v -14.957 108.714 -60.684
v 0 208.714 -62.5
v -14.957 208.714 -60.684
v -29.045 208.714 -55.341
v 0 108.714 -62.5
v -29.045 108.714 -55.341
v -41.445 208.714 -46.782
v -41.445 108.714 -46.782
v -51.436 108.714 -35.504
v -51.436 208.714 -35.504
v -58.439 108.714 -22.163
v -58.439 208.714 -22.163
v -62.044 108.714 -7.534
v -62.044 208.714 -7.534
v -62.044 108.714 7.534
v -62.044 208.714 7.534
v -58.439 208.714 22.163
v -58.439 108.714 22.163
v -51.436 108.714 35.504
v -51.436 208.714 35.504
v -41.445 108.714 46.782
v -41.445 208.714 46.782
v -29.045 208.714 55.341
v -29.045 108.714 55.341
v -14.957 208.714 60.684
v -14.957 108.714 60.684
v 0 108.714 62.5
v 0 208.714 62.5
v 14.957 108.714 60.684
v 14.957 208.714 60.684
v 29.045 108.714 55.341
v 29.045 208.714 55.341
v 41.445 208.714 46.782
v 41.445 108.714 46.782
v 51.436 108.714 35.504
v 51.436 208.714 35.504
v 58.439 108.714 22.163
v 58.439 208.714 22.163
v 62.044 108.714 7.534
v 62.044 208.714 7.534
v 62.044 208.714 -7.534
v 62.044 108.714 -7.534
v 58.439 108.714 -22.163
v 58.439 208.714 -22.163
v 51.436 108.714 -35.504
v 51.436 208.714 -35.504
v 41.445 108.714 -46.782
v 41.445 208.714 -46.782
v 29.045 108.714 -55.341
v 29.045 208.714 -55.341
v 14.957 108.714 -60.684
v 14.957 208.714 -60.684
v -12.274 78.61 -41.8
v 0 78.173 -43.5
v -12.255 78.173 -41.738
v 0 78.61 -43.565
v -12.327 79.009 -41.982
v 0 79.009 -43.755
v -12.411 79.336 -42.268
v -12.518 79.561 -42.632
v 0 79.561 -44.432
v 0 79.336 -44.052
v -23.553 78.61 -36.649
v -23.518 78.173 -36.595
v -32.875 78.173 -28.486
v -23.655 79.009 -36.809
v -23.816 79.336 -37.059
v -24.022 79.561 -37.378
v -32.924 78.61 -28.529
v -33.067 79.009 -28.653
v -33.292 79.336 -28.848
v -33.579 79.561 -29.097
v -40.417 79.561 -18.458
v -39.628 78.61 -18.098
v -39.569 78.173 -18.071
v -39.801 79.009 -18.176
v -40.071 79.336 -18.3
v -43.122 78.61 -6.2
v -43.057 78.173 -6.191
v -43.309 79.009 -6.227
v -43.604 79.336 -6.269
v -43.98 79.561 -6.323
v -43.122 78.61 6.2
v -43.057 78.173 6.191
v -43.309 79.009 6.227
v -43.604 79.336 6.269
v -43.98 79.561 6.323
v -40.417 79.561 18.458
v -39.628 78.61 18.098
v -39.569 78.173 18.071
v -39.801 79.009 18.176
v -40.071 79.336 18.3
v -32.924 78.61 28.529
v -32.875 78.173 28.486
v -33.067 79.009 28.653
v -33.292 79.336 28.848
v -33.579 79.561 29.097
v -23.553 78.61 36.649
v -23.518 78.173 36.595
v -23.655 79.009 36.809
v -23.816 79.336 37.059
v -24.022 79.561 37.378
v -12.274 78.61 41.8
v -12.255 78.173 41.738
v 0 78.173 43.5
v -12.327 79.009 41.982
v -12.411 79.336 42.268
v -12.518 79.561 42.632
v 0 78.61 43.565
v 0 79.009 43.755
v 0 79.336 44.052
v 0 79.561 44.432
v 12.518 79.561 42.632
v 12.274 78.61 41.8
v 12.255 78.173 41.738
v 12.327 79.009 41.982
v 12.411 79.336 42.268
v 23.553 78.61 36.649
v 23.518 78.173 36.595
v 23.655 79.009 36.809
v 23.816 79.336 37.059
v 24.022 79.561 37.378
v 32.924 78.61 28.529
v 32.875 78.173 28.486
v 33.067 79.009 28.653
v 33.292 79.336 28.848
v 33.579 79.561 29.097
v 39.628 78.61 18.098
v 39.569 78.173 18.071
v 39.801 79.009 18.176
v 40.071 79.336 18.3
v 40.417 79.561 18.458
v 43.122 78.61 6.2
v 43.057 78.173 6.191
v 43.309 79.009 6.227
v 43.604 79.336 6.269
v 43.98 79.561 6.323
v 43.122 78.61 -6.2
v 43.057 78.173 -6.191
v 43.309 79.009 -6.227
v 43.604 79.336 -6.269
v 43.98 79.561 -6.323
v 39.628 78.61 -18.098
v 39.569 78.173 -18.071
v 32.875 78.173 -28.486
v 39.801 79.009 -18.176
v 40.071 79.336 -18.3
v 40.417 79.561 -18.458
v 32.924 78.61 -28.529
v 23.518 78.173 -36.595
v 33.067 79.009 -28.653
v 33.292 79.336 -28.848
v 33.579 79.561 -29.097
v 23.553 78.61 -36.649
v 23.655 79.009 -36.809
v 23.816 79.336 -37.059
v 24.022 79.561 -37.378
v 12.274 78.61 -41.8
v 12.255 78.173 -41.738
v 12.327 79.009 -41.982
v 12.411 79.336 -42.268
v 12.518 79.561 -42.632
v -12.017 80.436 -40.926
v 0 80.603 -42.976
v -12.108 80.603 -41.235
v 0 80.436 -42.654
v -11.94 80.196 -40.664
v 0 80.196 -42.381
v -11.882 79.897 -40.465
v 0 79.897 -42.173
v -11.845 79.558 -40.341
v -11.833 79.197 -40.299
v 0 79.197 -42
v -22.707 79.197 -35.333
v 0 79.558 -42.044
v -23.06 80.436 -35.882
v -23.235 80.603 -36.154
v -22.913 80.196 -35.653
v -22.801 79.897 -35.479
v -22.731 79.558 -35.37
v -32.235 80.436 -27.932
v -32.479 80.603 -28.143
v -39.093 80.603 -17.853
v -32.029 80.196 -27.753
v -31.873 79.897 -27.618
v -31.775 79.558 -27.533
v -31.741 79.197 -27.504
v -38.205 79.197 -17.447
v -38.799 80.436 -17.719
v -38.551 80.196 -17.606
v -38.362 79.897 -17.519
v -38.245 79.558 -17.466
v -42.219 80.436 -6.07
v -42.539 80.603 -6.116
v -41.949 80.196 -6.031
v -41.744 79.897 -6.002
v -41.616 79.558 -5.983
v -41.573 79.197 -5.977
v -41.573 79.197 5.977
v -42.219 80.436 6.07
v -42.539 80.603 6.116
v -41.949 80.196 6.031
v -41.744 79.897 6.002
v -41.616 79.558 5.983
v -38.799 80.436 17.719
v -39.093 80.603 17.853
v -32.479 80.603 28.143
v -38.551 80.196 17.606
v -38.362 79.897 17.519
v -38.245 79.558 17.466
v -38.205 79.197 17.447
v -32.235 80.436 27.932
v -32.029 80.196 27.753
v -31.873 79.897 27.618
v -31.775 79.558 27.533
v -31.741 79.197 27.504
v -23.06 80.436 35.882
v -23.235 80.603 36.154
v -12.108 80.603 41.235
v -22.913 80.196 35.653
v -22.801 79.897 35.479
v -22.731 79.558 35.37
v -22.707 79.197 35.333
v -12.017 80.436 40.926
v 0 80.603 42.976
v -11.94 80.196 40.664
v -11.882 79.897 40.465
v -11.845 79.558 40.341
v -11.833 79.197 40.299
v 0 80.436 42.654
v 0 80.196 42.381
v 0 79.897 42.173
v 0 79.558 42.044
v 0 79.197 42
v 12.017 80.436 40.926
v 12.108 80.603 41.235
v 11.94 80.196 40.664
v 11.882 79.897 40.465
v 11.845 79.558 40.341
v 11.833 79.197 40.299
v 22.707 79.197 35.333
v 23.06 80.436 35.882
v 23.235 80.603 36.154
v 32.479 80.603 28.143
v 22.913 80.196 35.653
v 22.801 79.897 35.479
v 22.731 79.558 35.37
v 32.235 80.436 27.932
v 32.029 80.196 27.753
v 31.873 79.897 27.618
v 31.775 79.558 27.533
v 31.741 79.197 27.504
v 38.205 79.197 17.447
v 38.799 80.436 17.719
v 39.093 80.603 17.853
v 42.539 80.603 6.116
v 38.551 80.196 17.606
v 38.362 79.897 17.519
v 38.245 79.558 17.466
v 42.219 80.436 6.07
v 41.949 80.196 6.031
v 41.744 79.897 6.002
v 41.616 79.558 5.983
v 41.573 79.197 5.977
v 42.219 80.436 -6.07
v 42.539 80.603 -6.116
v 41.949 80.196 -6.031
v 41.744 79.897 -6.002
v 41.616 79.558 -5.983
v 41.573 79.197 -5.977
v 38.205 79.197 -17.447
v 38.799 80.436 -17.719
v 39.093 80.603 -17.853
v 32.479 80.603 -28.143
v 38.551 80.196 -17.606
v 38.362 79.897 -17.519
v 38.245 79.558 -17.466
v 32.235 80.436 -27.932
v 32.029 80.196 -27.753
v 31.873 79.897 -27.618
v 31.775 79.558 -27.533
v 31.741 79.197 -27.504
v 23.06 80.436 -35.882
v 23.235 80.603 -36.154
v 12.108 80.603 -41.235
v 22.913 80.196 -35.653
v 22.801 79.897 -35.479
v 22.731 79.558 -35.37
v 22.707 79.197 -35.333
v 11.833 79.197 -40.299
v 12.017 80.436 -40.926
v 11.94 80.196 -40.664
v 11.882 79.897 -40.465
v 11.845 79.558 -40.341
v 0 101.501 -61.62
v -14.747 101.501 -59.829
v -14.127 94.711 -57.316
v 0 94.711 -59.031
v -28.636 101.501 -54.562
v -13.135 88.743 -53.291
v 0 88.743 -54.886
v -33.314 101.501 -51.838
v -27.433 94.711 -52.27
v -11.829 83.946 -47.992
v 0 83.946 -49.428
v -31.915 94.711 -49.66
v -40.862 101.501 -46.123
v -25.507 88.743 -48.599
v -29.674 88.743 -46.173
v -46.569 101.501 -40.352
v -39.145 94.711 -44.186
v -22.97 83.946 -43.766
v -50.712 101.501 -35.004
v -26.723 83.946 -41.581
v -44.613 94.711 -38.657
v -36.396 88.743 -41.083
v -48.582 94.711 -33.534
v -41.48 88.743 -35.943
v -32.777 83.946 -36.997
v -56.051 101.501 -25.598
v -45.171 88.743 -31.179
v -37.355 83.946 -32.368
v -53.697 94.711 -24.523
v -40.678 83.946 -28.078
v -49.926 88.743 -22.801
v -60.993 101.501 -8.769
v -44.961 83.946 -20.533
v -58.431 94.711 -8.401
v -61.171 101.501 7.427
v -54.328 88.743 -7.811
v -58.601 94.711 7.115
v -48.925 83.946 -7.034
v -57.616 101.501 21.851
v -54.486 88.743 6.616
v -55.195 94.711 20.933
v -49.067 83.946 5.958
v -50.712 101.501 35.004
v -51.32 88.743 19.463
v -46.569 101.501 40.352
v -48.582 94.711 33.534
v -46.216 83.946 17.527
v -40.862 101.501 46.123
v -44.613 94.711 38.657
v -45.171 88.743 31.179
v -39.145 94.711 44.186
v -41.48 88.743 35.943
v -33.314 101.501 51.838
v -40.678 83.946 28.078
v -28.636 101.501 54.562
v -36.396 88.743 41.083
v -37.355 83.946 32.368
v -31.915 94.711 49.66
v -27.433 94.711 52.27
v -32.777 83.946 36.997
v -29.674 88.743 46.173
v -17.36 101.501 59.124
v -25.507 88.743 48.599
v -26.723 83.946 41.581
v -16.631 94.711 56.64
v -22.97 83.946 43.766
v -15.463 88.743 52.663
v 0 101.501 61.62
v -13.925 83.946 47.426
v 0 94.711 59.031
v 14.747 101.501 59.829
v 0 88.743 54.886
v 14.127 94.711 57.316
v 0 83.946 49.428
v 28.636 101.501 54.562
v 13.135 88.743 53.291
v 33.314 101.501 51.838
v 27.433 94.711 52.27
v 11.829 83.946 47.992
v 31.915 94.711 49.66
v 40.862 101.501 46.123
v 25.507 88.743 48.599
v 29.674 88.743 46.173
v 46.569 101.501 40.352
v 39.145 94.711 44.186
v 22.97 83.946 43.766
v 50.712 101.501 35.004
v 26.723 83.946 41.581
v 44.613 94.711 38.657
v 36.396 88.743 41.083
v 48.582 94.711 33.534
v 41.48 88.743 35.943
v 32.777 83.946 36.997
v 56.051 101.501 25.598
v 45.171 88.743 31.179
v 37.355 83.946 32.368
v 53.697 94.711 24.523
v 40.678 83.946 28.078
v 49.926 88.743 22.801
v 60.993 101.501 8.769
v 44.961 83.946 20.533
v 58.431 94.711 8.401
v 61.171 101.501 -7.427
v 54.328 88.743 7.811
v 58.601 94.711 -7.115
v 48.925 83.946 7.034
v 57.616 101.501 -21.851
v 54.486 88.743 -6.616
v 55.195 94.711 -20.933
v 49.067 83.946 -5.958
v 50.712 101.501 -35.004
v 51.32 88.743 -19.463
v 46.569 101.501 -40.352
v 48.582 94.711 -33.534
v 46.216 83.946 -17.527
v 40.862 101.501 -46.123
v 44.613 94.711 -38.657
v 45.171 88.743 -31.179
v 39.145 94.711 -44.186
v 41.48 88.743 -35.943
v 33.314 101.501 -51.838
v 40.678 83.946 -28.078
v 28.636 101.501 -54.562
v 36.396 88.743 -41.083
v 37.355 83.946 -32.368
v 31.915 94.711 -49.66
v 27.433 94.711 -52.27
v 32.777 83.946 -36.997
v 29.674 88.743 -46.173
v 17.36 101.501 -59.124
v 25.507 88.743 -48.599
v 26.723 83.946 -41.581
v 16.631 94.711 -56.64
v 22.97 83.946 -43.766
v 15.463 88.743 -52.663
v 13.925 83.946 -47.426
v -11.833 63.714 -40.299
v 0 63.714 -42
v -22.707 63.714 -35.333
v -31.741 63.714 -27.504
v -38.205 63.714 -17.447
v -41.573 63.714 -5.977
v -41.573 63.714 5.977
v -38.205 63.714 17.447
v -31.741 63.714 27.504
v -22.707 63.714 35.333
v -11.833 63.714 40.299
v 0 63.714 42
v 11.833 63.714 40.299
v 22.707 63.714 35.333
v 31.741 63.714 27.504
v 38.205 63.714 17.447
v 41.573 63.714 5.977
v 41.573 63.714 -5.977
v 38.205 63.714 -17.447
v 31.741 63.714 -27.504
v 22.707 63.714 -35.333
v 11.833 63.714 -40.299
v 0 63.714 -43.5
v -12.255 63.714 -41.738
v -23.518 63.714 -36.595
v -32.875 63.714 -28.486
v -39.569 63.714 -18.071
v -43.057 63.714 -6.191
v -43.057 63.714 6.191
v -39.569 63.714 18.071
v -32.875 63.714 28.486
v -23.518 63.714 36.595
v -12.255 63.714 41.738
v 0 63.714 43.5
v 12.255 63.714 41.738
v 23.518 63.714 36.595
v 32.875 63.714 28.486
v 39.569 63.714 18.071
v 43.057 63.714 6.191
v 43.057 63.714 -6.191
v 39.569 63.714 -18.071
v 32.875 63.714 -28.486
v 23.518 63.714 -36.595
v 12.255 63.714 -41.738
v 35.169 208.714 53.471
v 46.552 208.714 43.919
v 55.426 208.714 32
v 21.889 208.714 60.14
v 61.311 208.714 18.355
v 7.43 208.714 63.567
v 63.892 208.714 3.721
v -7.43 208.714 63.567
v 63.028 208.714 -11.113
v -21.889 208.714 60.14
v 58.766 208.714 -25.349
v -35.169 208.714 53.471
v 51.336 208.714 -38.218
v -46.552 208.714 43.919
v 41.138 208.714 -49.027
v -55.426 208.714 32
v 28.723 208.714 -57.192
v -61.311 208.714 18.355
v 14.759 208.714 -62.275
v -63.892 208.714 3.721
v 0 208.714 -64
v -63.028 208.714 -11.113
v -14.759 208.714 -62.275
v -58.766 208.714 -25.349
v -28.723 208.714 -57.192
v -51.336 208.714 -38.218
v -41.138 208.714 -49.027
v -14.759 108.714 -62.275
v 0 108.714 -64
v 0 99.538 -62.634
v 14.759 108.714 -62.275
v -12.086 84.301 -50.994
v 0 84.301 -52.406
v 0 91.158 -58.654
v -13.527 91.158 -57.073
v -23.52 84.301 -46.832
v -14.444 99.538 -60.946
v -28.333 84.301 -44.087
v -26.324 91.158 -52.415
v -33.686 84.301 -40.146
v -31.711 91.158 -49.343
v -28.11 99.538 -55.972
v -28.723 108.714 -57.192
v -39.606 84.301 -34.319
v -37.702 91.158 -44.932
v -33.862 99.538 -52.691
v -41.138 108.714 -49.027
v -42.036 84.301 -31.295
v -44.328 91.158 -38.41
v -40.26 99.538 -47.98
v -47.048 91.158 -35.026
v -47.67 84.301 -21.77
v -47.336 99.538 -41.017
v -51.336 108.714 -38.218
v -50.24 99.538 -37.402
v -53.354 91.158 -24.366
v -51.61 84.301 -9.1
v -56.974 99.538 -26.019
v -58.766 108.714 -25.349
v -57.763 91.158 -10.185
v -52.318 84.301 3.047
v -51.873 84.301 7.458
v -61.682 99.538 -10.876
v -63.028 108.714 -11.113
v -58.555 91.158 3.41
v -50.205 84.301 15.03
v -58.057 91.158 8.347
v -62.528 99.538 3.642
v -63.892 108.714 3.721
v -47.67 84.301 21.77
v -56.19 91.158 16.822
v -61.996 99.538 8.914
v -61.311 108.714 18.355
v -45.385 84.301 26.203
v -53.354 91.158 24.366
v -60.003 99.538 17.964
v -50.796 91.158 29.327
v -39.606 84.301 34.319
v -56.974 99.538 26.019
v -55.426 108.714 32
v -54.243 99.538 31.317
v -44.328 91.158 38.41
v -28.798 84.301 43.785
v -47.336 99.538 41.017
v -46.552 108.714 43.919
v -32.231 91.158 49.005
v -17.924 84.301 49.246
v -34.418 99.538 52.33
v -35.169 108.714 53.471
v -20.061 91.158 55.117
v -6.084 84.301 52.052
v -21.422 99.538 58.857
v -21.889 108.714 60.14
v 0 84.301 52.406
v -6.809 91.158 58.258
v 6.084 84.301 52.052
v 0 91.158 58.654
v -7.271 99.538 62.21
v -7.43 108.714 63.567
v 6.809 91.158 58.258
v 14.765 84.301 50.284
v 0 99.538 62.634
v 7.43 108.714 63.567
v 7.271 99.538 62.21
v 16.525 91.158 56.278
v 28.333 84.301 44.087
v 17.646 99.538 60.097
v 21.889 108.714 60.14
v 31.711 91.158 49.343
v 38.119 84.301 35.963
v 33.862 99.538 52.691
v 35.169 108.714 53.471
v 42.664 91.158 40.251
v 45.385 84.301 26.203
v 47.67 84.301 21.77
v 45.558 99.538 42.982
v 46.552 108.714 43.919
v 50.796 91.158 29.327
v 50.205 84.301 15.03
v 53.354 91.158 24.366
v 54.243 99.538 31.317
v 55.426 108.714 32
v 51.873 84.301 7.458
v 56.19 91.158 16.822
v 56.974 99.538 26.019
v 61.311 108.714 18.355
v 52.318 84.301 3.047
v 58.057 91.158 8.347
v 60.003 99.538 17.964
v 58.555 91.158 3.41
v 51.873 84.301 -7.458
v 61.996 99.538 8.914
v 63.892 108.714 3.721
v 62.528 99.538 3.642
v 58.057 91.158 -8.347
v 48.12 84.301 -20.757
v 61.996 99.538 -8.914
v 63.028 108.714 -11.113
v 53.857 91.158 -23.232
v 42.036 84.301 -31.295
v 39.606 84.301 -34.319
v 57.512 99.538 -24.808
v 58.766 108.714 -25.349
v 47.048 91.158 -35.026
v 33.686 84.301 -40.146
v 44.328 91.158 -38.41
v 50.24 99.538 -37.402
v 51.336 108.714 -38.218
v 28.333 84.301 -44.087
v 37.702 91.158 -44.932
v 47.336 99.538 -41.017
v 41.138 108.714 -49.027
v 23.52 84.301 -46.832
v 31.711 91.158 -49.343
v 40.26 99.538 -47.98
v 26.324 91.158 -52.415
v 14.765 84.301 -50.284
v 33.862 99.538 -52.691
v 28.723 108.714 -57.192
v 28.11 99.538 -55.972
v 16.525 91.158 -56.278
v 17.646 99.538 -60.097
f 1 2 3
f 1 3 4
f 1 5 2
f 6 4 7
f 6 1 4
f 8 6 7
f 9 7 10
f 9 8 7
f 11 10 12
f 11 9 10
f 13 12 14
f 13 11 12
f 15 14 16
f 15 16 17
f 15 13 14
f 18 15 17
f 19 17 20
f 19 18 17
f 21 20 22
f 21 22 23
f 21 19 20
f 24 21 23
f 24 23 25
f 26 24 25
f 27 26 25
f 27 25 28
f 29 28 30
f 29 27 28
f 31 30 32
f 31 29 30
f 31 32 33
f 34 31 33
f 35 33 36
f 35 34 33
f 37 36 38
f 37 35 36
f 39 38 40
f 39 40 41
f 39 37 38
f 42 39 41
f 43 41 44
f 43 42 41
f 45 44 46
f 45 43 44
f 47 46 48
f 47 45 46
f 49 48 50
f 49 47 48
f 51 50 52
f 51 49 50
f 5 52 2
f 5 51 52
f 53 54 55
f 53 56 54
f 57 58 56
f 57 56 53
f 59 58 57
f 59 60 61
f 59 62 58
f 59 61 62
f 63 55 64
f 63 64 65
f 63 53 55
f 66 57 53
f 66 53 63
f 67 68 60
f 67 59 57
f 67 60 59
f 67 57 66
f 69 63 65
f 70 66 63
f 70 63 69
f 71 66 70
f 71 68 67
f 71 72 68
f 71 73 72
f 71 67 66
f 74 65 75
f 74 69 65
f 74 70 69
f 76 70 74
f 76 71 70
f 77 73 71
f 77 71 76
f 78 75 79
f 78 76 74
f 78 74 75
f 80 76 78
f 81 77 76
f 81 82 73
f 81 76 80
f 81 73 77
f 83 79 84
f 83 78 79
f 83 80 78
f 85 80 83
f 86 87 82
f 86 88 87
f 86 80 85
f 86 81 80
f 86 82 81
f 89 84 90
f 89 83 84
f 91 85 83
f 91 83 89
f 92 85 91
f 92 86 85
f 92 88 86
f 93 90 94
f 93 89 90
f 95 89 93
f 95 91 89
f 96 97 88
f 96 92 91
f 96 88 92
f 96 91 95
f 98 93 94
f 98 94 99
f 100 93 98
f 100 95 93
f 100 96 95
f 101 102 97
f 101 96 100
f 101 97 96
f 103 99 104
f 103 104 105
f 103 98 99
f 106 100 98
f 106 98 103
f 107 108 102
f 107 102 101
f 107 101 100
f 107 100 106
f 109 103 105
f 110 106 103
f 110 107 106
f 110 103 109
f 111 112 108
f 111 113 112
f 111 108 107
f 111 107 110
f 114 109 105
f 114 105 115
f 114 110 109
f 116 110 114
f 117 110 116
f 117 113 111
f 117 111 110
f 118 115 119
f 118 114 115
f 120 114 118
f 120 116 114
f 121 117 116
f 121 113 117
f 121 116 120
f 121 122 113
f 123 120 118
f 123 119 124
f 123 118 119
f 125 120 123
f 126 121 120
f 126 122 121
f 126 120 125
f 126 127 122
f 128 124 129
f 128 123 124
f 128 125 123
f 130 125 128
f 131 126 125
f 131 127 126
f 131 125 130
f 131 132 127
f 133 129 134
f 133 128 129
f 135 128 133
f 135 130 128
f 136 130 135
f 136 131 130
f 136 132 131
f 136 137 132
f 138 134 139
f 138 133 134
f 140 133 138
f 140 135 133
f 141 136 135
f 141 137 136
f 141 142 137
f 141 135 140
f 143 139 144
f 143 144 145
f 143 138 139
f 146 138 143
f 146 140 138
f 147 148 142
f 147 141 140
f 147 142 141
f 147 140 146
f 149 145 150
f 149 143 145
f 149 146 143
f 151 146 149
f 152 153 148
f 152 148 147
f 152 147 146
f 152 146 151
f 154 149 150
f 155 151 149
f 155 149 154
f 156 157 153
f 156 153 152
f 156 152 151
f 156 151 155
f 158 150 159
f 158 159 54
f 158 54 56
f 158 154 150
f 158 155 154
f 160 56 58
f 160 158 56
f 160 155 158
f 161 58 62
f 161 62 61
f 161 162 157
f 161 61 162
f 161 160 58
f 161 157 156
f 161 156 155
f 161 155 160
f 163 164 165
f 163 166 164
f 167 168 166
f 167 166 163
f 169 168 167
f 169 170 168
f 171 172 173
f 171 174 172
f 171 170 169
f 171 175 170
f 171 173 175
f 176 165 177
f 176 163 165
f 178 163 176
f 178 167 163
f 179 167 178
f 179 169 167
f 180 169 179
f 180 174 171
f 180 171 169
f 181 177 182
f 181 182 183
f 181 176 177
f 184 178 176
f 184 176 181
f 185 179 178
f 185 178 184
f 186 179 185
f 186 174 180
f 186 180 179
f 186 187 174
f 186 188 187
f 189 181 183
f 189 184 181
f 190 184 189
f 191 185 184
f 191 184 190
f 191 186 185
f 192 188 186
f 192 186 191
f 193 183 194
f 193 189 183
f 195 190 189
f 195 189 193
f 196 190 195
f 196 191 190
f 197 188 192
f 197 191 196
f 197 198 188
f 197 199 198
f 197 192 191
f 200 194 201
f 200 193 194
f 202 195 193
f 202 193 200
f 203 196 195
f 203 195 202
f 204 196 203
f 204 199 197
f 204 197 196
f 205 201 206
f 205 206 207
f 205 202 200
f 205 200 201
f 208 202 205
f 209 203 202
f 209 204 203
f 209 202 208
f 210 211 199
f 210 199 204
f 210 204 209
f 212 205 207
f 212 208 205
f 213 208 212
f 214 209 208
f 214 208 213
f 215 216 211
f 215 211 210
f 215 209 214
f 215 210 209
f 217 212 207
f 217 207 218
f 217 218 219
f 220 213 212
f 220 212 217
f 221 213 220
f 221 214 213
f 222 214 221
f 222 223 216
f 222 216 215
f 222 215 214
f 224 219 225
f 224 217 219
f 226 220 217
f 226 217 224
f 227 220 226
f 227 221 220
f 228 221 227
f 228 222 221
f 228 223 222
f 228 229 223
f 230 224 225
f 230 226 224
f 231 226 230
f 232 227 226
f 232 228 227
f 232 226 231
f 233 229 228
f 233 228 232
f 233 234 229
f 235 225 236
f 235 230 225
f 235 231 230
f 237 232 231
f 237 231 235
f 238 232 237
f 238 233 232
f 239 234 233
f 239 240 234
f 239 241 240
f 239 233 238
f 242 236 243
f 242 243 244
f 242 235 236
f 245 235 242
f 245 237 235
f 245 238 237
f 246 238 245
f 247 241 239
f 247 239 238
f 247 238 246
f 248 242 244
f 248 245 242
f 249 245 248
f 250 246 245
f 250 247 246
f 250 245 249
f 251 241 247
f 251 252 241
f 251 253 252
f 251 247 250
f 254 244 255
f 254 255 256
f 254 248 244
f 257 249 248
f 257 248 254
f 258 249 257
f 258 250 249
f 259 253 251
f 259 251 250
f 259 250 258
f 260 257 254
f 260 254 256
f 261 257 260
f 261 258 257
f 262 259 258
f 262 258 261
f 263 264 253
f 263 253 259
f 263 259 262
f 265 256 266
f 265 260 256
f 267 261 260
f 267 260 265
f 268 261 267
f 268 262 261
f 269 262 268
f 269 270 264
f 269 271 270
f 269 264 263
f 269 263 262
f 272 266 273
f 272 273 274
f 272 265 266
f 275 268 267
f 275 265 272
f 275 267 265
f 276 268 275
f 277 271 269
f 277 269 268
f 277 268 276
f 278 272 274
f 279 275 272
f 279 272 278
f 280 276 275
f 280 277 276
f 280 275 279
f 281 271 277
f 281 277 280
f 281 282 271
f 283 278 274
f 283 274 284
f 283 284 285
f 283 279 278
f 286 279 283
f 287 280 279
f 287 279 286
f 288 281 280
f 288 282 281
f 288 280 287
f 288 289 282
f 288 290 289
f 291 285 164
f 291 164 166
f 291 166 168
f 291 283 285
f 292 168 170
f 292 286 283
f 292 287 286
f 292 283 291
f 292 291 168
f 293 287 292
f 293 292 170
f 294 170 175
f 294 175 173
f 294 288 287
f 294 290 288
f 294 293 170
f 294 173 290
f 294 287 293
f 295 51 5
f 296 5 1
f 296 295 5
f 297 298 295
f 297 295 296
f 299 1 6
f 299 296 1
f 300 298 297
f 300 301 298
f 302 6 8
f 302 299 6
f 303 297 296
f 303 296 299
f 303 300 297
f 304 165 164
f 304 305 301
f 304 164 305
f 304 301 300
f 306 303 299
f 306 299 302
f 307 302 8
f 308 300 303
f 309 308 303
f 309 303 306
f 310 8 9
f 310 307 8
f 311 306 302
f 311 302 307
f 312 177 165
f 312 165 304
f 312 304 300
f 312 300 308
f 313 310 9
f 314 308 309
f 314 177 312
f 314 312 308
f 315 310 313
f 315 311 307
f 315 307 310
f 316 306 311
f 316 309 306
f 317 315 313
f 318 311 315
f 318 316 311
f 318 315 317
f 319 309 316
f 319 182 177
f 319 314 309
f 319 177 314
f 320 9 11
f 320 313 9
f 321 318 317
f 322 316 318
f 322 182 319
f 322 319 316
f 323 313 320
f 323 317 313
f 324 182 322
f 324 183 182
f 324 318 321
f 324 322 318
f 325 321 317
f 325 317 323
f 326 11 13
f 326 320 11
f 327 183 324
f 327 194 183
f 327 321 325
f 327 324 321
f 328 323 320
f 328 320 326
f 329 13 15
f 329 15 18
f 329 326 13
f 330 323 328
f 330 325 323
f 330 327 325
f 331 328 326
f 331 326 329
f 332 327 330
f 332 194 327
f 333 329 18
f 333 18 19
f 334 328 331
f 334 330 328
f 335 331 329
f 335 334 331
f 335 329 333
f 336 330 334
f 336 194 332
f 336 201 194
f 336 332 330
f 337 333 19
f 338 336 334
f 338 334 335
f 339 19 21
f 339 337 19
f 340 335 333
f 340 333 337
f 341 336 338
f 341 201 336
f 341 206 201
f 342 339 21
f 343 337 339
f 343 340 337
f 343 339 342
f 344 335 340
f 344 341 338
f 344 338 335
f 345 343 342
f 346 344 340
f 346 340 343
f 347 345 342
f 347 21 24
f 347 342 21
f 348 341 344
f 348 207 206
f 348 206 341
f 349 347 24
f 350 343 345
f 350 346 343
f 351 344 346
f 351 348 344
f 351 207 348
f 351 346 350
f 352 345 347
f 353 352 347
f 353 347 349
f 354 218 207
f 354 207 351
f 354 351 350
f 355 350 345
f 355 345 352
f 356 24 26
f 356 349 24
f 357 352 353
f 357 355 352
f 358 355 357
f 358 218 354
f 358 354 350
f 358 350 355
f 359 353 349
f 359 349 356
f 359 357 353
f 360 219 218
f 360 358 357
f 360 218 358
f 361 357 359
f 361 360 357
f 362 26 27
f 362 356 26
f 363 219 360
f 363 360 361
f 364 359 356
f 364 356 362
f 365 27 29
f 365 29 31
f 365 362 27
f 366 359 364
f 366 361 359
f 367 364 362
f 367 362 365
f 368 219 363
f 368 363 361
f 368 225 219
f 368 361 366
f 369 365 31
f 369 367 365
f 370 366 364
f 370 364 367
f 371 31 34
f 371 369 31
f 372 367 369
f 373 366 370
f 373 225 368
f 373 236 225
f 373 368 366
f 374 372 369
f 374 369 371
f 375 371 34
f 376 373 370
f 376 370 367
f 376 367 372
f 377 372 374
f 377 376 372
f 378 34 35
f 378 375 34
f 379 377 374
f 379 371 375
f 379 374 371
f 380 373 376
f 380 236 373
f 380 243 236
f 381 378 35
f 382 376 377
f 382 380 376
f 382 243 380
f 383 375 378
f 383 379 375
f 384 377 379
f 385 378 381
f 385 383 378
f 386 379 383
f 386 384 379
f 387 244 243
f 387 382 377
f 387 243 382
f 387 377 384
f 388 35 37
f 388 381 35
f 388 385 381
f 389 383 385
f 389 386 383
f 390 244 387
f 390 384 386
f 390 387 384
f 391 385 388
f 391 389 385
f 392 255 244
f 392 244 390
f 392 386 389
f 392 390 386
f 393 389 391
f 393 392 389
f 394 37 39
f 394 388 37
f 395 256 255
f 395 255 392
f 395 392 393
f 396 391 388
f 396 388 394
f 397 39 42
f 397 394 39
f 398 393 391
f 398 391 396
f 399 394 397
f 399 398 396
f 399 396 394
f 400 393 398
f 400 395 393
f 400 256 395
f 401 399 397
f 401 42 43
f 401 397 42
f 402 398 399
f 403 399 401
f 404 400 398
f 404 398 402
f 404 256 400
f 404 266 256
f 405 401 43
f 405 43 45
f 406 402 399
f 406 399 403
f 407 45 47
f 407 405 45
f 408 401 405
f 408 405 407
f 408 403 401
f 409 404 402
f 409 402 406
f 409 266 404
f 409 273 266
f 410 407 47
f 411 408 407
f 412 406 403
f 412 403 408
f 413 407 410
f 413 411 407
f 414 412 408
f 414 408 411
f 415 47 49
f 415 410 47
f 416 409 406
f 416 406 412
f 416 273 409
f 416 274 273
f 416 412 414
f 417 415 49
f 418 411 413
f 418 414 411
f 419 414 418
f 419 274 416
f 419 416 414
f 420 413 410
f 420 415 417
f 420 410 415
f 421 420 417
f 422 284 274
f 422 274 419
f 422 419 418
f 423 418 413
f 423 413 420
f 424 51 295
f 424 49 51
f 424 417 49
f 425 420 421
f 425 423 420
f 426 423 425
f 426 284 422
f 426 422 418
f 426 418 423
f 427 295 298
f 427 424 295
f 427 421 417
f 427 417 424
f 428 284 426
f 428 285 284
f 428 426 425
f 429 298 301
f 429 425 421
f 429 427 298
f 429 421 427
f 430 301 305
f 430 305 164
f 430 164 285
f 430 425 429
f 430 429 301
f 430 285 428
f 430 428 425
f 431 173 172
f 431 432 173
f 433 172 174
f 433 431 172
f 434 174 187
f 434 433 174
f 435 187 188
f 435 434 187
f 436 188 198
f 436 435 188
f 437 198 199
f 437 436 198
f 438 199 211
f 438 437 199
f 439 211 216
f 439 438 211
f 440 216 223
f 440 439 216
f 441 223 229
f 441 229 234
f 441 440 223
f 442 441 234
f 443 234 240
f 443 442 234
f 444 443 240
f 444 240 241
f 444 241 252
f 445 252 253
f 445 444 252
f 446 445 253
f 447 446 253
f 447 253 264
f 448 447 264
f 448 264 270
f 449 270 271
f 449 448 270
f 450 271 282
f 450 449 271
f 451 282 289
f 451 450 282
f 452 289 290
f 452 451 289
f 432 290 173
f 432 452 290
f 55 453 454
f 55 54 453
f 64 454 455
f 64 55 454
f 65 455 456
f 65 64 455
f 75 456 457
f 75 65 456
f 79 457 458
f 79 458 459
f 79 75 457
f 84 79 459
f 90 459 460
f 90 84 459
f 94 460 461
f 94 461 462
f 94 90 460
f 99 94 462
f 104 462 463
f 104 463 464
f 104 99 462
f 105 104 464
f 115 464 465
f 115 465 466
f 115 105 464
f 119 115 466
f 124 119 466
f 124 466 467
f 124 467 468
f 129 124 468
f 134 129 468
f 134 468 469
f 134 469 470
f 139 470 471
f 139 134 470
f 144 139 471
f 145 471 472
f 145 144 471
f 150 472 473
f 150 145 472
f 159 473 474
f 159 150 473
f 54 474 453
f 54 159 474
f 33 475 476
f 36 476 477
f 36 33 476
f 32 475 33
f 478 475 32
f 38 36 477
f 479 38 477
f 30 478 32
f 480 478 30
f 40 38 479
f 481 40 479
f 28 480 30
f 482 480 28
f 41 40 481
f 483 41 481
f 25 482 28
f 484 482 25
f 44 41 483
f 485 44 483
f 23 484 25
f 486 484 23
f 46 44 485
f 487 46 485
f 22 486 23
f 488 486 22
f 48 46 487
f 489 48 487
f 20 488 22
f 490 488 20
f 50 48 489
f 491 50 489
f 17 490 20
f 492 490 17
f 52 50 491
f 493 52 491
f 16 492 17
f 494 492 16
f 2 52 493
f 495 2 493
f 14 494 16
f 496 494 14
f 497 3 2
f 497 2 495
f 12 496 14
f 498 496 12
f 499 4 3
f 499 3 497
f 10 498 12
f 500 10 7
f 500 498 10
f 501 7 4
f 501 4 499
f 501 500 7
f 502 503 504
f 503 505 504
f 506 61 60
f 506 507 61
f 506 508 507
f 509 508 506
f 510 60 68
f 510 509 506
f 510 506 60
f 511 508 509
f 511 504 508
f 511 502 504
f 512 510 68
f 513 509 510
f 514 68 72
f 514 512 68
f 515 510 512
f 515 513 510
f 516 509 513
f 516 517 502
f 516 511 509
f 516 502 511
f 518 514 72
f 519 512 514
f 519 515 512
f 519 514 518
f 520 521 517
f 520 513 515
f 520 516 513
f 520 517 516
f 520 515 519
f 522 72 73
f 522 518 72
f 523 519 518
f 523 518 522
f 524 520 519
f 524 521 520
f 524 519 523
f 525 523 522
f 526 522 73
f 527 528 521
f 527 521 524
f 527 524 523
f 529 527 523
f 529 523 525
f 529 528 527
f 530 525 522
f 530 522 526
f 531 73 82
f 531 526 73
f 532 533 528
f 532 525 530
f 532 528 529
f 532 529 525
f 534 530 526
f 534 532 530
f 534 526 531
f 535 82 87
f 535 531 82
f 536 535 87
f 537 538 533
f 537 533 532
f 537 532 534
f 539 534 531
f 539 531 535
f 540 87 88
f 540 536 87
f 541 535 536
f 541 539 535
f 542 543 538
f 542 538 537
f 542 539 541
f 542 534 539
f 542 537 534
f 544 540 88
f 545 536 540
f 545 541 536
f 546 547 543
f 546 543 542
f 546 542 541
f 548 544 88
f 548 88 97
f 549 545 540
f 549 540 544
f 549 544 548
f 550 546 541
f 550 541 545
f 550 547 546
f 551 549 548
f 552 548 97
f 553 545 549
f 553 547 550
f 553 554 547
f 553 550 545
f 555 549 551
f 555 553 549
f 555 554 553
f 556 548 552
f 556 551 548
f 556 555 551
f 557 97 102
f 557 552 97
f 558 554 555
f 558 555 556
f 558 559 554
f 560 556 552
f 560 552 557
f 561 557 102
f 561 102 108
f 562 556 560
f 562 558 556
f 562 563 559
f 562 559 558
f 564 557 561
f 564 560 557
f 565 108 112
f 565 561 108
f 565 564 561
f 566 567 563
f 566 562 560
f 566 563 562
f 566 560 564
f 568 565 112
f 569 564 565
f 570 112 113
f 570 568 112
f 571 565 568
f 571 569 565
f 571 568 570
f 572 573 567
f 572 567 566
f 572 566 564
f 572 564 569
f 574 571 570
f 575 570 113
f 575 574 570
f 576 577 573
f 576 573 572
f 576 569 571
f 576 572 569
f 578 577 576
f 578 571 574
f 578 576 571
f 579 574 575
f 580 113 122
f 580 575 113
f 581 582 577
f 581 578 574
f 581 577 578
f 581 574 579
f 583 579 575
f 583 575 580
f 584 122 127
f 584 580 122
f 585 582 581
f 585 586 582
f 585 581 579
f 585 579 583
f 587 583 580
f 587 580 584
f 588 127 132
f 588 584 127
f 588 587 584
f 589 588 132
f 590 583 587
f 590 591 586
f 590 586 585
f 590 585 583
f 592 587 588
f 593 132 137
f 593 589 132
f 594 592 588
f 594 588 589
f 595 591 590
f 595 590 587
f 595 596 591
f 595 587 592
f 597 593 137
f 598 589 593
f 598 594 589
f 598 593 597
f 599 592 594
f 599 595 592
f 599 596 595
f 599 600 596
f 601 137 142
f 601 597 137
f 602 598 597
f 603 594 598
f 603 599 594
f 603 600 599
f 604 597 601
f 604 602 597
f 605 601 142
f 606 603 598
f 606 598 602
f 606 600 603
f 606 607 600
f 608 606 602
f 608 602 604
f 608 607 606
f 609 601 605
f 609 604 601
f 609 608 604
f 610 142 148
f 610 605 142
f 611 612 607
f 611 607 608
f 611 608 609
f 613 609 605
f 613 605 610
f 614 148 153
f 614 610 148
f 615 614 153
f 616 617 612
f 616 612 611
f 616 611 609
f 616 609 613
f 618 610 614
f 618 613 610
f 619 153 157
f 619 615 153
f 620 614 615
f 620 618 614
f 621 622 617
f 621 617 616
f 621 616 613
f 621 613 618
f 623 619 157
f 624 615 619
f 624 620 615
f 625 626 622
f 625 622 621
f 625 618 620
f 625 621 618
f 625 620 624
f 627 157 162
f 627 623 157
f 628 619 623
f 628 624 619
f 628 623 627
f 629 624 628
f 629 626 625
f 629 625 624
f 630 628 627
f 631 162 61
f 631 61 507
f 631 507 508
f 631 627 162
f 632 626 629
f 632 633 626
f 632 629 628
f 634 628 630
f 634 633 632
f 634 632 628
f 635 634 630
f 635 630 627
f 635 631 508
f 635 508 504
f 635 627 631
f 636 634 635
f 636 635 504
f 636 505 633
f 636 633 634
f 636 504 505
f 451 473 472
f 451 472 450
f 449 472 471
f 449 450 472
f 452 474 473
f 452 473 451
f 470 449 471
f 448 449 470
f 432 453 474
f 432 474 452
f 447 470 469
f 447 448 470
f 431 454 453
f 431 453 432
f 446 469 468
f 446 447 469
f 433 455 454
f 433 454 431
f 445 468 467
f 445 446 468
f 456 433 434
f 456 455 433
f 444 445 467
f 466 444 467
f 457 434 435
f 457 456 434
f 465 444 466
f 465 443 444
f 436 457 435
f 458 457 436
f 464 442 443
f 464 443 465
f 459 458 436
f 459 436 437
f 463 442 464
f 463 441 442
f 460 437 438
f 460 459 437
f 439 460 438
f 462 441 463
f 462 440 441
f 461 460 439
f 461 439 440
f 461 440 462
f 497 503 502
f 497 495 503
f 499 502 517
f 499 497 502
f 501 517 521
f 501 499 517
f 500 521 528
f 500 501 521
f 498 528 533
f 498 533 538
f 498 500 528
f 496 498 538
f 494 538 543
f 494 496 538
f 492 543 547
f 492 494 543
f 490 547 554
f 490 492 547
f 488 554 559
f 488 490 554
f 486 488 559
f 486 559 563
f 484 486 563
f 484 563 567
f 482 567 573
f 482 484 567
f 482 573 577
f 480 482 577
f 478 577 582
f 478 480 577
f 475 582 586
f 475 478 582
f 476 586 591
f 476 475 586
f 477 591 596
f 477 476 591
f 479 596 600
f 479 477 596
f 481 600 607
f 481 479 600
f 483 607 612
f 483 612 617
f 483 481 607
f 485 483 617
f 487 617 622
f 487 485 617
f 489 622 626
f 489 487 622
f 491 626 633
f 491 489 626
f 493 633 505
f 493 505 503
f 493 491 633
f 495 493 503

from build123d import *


with BuildPart() as part:
    # Çizim1 → Döndür1 (revolve)
    with BuildSketch(Plane.XY, mode=Mode.PRIVATE) as d_nd_r1_sk:
        with BuildLine():
            Line((-62.5, 208.714063436), (-62.5, 108.714063436))
            ThreePointArc((-62.5, 108.714063436), (-57.140269015, 91.600994078), (-42.976190476, 80.602687925))
            ThreePointArc((-42.976190476, 80.602687925), (-42.267986549, 80.052772618), (-42, 79.19711915))
            Line((-42, 79.19711915), (-42, 63.714063436))
            Line((-42, 63.714063436), (-43.5, 63.714063436))
            Line((-43.5, 63.714063436), (-43.5, 78.173107328))
            ThreePointArc((-43.5, 78.173107328), (-43.754553749, 79.009087972), (-44.431818182, 79.561332606))
            ThreePointArc((-44.431818182, 79.561332606), (-58.654371267, 91.158469922), (-64, 108.714063436))
            Line((-64, 108.714063436), (-64, 208.714063436))
            Line((-64, 208.714063436), (-62.5, 208.714063436))
        make_face()
    revolve(d_nd_r1_sk.sketch.rotate(Axis((0, 0, 0), (0, 1, 0)), 270), axis=Axis((0, 0, 0), (0, 1, 0)))


solid = part.part
